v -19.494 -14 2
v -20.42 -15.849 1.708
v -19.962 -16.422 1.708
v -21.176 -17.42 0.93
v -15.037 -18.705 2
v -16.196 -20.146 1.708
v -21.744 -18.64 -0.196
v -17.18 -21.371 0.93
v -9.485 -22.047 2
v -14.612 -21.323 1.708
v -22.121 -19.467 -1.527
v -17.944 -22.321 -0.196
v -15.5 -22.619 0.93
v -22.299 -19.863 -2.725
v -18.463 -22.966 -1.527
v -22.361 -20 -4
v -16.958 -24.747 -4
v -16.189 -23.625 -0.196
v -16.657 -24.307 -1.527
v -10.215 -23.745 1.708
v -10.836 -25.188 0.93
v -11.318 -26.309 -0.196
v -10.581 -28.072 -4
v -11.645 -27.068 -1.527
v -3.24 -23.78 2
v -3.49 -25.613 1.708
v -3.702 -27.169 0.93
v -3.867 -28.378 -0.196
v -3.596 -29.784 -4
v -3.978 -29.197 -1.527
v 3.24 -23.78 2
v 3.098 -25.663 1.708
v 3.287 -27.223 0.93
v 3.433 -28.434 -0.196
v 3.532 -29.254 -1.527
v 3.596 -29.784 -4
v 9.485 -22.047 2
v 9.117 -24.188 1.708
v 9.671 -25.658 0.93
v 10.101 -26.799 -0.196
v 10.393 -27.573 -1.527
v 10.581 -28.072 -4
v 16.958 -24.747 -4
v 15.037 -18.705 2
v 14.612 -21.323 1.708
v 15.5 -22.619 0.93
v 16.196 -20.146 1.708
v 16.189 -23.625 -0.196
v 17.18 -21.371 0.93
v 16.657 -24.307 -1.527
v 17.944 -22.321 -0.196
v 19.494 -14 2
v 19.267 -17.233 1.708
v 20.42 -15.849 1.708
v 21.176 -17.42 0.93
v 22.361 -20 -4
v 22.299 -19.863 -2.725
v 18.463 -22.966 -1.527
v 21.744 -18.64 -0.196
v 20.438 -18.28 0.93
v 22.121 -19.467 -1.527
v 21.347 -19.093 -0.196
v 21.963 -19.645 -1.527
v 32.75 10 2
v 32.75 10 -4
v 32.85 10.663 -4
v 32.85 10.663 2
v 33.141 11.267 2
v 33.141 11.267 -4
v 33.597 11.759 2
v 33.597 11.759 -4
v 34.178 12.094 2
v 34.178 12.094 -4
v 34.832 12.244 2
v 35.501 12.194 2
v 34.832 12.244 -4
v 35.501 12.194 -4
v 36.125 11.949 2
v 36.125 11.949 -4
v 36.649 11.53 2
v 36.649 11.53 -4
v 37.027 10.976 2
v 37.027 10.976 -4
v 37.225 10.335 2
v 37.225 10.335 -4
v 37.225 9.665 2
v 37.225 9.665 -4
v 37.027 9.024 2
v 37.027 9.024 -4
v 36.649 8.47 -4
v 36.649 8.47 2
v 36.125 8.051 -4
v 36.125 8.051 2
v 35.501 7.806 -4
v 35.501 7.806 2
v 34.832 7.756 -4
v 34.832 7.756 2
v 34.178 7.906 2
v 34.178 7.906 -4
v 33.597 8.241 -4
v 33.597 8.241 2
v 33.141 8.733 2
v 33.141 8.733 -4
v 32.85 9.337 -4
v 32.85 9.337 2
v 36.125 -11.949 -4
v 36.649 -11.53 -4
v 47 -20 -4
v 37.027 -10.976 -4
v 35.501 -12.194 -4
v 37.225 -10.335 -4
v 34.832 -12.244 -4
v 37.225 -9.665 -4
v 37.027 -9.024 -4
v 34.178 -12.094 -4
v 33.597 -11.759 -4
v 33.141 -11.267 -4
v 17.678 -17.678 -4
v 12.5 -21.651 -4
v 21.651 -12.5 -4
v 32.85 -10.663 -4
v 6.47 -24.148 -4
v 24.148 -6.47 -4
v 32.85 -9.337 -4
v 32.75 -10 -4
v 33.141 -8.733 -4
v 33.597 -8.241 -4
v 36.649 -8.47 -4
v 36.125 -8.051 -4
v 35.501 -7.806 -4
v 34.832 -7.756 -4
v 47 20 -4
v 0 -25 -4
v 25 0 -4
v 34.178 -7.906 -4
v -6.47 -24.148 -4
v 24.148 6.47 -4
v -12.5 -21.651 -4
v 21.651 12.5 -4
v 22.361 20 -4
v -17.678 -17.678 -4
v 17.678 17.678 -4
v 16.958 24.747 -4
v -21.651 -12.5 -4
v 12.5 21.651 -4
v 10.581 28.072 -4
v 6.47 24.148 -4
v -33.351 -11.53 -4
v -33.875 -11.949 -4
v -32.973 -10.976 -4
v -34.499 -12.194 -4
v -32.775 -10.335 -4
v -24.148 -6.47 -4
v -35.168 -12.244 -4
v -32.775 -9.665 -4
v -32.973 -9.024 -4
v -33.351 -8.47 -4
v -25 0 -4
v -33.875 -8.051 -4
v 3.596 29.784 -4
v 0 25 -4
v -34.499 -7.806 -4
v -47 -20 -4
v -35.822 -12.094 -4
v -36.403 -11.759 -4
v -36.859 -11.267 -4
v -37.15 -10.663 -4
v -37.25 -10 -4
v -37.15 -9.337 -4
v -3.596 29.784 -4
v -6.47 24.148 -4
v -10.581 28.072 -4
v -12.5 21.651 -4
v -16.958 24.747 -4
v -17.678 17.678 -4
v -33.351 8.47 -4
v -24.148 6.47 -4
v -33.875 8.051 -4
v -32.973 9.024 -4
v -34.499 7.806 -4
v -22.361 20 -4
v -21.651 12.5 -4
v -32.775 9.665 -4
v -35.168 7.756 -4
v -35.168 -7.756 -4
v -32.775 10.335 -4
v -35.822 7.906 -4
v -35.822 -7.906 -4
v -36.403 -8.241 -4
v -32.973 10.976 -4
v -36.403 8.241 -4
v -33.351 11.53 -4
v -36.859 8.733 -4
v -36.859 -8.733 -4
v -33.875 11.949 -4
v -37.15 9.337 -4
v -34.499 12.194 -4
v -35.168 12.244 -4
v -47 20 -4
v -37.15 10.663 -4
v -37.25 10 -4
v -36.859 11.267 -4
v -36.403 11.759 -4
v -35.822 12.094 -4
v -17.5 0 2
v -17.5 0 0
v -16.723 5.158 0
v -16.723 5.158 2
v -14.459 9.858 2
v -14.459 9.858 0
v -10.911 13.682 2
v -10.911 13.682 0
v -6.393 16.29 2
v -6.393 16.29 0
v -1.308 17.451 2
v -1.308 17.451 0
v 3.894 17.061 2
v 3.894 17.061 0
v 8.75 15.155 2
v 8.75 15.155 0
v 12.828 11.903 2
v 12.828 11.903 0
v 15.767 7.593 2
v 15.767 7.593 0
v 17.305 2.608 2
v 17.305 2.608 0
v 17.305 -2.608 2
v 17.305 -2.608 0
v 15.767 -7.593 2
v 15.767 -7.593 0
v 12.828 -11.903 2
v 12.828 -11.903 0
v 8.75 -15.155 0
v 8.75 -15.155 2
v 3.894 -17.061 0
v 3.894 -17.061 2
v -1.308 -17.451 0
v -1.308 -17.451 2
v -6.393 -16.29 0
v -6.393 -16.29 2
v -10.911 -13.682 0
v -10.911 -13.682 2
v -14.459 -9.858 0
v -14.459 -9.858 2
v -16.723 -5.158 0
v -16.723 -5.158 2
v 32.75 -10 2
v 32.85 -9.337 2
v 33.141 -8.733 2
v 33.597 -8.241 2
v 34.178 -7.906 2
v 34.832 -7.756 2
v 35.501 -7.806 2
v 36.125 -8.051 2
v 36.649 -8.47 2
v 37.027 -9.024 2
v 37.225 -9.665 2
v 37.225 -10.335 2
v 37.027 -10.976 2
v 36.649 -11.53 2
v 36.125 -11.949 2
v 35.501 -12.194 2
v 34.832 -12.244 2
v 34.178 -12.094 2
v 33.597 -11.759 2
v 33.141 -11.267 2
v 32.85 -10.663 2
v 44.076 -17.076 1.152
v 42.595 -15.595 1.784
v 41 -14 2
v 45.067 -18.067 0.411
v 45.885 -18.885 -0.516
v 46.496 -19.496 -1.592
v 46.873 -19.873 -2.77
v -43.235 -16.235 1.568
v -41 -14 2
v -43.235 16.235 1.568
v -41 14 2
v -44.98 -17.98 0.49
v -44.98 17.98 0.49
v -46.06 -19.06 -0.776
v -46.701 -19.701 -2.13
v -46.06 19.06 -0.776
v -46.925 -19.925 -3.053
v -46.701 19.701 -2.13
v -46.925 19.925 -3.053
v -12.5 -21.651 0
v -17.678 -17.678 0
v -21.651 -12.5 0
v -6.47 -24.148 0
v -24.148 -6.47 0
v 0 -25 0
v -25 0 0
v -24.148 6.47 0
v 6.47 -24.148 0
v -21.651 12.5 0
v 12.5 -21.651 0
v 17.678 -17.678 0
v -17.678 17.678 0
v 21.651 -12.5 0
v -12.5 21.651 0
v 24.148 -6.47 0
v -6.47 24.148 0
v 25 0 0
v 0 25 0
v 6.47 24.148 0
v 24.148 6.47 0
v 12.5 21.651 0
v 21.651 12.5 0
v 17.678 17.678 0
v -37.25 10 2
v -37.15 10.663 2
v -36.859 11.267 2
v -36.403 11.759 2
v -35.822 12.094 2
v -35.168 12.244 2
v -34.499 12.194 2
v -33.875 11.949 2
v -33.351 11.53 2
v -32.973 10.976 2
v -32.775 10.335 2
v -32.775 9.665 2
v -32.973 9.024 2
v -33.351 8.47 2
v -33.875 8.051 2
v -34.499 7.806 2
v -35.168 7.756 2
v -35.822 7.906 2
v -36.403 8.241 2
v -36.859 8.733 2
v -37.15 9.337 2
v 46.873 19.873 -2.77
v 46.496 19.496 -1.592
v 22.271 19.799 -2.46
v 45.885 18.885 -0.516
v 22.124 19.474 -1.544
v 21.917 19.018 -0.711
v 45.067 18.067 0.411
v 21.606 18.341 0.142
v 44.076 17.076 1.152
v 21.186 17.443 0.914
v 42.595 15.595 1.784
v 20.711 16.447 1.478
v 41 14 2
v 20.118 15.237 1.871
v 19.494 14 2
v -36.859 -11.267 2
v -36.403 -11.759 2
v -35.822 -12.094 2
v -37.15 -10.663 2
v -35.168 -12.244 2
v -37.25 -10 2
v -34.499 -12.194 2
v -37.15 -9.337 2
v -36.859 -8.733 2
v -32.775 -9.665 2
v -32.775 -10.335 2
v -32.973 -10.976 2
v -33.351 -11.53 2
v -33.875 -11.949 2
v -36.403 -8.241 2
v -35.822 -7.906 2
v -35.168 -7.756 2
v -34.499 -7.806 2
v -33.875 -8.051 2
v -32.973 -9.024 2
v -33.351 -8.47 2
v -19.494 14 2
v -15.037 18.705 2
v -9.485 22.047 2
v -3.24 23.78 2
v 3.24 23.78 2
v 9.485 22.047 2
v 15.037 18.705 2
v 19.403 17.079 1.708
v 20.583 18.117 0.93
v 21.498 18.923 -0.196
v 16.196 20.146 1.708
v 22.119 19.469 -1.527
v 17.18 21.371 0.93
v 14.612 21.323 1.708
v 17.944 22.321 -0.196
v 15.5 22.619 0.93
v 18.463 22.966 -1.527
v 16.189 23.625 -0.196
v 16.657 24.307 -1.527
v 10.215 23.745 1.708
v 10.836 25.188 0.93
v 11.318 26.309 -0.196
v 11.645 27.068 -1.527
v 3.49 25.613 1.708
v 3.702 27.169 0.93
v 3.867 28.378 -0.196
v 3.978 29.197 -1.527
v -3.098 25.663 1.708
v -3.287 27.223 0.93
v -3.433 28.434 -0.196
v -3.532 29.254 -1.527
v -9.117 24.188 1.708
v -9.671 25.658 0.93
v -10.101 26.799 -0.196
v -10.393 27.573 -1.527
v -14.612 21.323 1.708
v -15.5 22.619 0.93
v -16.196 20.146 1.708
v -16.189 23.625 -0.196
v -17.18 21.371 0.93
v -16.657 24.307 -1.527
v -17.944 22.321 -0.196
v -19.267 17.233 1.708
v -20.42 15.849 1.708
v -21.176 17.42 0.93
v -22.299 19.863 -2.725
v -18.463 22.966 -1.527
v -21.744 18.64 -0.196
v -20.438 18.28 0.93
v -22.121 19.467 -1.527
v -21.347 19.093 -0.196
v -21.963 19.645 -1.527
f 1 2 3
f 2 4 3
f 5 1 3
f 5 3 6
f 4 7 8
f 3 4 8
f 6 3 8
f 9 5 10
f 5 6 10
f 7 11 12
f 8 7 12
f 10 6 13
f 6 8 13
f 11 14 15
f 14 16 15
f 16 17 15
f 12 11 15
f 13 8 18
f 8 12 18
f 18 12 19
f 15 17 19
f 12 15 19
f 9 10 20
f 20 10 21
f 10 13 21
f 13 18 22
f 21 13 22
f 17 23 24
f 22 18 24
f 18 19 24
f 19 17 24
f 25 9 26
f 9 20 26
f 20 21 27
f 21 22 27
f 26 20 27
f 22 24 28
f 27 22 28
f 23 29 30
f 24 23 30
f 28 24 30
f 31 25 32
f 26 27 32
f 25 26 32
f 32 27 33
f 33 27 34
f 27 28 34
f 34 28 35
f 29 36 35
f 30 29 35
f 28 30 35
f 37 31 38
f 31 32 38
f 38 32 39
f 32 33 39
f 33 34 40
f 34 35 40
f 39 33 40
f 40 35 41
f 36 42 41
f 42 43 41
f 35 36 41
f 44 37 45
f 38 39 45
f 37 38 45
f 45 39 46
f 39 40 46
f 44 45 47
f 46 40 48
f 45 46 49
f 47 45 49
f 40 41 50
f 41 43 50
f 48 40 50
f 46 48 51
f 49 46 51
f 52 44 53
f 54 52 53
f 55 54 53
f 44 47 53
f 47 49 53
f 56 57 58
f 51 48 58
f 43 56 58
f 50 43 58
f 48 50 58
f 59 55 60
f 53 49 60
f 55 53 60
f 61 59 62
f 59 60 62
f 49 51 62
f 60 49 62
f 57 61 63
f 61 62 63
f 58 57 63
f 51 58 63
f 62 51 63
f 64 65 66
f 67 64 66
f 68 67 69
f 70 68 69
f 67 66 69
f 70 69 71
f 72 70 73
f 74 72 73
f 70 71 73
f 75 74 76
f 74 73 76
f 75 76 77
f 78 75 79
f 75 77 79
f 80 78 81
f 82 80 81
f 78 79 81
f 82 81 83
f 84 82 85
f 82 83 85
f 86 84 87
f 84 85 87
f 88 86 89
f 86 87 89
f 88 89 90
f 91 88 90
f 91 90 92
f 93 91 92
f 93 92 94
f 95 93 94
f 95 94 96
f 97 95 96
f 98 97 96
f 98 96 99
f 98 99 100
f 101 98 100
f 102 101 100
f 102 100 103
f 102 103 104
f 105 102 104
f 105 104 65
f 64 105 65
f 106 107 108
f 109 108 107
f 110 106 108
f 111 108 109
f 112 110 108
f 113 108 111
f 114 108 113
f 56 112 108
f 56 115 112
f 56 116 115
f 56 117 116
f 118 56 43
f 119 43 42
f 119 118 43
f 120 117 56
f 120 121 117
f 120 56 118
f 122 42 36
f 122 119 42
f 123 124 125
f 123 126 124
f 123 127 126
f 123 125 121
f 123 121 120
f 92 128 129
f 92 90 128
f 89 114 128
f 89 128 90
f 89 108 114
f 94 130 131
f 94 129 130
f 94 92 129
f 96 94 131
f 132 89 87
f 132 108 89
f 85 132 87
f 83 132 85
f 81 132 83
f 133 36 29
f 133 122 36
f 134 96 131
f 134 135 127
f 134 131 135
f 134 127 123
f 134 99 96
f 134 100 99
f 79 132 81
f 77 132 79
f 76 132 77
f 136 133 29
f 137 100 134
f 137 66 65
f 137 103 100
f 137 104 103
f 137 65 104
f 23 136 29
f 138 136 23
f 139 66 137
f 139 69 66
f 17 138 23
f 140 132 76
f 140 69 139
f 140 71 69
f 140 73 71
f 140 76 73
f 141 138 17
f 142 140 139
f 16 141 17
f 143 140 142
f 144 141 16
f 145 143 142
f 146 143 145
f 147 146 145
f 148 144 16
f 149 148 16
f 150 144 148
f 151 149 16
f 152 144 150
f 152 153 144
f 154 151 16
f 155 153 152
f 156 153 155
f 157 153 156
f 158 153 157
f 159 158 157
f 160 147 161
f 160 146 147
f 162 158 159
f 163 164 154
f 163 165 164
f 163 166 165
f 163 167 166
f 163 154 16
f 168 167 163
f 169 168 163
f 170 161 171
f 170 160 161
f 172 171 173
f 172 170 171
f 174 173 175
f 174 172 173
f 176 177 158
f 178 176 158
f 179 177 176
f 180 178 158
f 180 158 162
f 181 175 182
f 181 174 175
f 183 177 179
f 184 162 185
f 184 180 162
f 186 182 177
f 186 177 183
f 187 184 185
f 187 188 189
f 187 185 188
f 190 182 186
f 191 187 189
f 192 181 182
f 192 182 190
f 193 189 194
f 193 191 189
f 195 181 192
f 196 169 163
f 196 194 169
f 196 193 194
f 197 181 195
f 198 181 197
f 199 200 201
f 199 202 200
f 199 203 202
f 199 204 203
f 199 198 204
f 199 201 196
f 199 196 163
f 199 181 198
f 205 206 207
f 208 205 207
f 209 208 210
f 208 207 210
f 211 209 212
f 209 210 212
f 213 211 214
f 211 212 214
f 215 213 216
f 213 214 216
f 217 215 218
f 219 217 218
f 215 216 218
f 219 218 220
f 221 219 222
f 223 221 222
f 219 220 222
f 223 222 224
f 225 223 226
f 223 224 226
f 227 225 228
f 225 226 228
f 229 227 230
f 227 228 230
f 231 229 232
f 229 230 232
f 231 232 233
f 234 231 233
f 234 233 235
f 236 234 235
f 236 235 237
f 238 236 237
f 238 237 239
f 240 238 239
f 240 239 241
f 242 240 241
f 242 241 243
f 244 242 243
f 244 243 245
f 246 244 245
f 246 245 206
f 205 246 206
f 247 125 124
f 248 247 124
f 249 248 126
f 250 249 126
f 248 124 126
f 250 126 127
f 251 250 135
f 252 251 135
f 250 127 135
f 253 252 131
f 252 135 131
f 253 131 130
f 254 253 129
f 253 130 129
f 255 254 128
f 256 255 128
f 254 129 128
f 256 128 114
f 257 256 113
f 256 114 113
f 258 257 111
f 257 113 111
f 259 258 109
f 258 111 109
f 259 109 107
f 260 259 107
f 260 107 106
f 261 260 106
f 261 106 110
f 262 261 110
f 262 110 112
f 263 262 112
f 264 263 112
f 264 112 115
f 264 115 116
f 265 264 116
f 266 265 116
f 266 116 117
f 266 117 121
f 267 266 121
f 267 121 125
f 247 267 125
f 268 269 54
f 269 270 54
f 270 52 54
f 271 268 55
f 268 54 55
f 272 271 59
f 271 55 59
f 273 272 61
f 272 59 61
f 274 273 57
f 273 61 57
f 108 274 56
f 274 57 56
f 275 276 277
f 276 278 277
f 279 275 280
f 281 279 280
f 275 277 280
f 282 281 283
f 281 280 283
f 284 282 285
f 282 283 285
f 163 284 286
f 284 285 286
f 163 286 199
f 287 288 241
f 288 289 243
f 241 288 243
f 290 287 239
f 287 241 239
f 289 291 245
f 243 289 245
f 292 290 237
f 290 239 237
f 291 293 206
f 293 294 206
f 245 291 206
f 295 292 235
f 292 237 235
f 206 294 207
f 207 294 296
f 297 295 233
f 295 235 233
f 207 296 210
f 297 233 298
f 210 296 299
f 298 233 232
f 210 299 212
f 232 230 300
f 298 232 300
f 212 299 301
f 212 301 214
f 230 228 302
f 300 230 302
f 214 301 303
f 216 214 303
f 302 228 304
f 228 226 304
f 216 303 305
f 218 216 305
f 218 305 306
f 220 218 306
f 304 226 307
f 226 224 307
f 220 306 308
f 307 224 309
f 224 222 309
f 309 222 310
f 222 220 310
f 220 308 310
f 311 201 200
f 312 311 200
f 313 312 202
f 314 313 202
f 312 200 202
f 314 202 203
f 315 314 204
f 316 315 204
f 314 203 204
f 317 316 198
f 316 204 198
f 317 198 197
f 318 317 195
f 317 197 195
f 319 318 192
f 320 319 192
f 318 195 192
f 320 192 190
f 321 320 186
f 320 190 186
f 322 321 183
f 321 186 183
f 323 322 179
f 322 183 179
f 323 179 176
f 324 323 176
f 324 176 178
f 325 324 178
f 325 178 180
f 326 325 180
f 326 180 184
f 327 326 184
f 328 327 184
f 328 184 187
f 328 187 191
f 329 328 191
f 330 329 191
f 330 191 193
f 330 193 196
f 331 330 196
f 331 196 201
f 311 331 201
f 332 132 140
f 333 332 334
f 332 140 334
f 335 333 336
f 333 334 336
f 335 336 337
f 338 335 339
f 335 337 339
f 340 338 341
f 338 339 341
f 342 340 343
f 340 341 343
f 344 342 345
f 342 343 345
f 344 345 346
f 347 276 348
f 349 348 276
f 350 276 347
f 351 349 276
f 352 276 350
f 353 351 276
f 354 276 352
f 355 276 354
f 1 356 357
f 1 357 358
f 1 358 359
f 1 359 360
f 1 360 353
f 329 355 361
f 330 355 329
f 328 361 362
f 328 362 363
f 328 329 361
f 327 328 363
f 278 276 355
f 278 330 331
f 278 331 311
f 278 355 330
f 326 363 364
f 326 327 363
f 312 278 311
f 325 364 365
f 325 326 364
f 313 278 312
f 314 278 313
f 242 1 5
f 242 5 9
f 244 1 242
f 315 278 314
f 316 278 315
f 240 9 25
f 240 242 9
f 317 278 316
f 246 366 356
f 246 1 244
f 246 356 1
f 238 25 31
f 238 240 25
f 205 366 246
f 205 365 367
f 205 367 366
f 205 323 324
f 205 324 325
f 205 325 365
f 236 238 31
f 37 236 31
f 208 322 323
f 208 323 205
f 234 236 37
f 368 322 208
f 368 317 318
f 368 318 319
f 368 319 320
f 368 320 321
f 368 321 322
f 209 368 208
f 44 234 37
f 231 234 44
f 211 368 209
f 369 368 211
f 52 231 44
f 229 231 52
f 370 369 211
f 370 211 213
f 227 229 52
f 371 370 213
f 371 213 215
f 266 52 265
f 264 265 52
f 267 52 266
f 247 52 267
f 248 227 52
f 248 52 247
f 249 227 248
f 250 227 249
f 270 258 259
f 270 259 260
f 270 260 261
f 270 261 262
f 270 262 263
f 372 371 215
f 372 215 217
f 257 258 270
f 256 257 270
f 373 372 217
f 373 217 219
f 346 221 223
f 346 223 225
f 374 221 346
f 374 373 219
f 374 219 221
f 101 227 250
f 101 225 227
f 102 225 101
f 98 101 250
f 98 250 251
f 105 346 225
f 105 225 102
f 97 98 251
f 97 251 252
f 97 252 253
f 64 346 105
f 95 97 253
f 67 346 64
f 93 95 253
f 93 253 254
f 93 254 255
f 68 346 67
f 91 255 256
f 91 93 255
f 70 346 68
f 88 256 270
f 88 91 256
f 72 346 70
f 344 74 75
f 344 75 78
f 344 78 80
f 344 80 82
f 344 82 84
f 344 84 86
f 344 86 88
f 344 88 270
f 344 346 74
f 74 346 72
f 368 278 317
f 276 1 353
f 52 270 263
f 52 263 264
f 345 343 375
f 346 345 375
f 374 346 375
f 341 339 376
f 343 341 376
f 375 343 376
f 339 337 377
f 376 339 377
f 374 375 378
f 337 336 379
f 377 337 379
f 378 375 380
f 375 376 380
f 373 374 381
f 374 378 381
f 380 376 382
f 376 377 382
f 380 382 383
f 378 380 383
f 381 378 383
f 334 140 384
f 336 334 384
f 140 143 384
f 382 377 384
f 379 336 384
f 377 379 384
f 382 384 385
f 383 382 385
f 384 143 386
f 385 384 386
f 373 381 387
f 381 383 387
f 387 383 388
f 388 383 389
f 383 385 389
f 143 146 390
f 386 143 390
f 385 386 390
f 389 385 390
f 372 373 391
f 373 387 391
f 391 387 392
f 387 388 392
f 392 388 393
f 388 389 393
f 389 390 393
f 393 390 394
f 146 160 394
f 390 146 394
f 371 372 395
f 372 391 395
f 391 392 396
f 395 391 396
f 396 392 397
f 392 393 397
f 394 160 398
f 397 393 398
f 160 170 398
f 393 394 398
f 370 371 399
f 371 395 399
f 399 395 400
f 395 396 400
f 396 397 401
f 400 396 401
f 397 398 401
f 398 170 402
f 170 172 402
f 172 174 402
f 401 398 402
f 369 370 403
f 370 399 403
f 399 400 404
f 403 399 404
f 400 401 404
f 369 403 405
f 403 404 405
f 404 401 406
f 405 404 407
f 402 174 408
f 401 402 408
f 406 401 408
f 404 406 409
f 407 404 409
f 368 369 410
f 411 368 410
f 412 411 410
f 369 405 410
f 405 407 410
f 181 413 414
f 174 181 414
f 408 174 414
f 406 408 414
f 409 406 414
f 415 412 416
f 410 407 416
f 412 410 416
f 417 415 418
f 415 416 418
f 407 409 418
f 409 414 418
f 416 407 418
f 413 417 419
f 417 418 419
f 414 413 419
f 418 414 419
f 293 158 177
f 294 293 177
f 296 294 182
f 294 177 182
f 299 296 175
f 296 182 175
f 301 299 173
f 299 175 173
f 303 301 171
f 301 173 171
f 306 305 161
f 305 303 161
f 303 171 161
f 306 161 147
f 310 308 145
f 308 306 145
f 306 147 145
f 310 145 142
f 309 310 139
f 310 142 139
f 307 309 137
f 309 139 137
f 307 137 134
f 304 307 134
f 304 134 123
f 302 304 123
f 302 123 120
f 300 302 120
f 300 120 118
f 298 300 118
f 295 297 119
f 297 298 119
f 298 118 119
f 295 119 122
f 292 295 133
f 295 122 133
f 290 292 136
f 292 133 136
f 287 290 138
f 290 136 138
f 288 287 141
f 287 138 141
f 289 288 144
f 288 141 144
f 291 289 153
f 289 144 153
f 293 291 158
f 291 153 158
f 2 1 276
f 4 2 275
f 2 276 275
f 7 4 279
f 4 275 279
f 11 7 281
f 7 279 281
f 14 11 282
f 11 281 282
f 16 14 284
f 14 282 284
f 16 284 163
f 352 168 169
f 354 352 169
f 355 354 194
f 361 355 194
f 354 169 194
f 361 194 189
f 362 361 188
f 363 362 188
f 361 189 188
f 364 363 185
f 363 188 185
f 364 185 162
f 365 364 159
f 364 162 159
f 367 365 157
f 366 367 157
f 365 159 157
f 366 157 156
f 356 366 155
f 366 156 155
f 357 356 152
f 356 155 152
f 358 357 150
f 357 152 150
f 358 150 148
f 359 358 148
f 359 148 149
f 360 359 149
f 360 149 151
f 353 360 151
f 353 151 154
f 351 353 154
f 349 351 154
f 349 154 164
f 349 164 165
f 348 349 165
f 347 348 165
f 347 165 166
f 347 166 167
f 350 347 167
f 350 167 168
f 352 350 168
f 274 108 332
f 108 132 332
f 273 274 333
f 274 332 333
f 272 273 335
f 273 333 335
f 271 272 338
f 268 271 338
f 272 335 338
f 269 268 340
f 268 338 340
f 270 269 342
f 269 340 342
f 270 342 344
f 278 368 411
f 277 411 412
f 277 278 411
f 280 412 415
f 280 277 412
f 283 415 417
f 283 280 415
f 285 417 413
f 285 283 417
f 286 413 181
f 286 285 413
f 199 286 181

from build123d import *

# Parameters (mm, degrees)
SKETCH1_R            = 30
BOSS_EXTRUDE1_DEPTH  = 2
BOSS_EXTRUDE2_START  = 4
SKETCH2_R            = 30
SKETCH2_R_2          = 25
BOSS_EXTRUDE2_DEPTH  = 4
BOSS_EXTRUDE3_REACH  = 44.849
SKETCH3_W            = 94
SKETCH3_H            = 40
SKETCH4_R            = 25
CUT_EXTRUDE1_DEPTH   = 4
SKETCH5_R            = 17.5
CUT_EXTRUDE2_DEPTH   = 56.901699437
FILLET1_R            = 6
M4_CLEARANCE_HOLE1_D = 4.5


with BuildPart() as part:
    # Sketch1 → Boss-Extrude1 (new body)
    with BuildSketch(Plane.XY):
        Circle(SKETCH1_R)
    extrude(amount=BOSS_EXTRUDE1_DEPTH)

    # Sketch2 → Boss-Extrude2 (add)
    with BuildSketch(Plane(origin=(0, 0, 0), x_dir=(-1, 0, 0), z_dir=(0, 0, -1)).offset(BOSS_EXTRUDE2_START)):
        Circle(SKETCH2_R)
        Circle(SKETCH2_R_2, mode=Mode.SUBTRACT)
    extrude(amount=-BOSS_EXTRUDE2_DEPTH)

    # Boss-Extrude3: up to this face of the body (flat: up to its plane)
    boss_extrude3_end = Plane(part.part.faces().sort_by_distance((0, 0, 2))[0])
    # Sketch3 → Boss-Extrude3 (add, up to the picked face)
    with BuildSketch(Plane(origin=(0, 0, -4), x_dir=(-1, 0, 0), z_dir=(0, 0, -1)), mode=Mode.PRIVATE) as boss_extrude3_sk1:
        Rectangle(SKETCH3_W, SKETCH3_H)
    boss_extrude3_tool1 = split(extrude(boss_extrude3_sk1.sketch, amount=-BOSS_EXTRUDE3_REACH, mode=Mode.PRIVATE), bisect_by=boss_extrude3_end, keep=Keep.BOTH, mode=Mode.PRIVATE)
    add(boss_extrude3_tool1.solids().sort_by(Axis((0, 0, -4), (0, 0, 1)))[0])

    # Sketch4 → Cut-Extrude1 (cut)
    with BuildSketch(Plane(origin=(0, 0, -4), x_dir=(-1, 0, 0), z_dir=(0, 0, -1))):
        Circle(SKETCH4_R)
    extrude(amount=-CUT_EXTRUDE1_DEPTH, mode=Mode.SUBTRACT)

    # Sketch5 → Cut-Extrude2 (cut, through all)
    with BuildSketch(Plane(origin=(0, 0, 0), x_dir=(-1, 0, 0), z_dir=(0, 0, -1))):
        Circle(SKETCH5_R)
    extrude(amount=-CUT_EXTRUDE2_DEPTH, mode=Mode.SUBTRACT)

    # Fillet1
    fillet1_edges = [part.edges().sort_by_distance(p)[0] for p in [
        (47, 0, 2),
        (34.680339887, -20, 2),
        (34.680339887, 20, 2),
        (0, 30, 2),
        (0, -30, 2),
        (-34.680339887, -20, 2),
        (-47, 0, 2),
        (-34.680339887, 20, 2),
    ]]
    fillet(fillet1_edges, radius=FILLET1_R - 0.0001)  # a hair under: the kernel refuses the full size

    # M4 Clearance Hole1 (through all)
    with Locations(Plane.XY.offset(2)):
        with Locations((-35, 10), (-35, -10), (35, 10), (35, -10)):
            Hole(M4_CLEARANCE_HOLE1_D / 2)


solid = part.part
